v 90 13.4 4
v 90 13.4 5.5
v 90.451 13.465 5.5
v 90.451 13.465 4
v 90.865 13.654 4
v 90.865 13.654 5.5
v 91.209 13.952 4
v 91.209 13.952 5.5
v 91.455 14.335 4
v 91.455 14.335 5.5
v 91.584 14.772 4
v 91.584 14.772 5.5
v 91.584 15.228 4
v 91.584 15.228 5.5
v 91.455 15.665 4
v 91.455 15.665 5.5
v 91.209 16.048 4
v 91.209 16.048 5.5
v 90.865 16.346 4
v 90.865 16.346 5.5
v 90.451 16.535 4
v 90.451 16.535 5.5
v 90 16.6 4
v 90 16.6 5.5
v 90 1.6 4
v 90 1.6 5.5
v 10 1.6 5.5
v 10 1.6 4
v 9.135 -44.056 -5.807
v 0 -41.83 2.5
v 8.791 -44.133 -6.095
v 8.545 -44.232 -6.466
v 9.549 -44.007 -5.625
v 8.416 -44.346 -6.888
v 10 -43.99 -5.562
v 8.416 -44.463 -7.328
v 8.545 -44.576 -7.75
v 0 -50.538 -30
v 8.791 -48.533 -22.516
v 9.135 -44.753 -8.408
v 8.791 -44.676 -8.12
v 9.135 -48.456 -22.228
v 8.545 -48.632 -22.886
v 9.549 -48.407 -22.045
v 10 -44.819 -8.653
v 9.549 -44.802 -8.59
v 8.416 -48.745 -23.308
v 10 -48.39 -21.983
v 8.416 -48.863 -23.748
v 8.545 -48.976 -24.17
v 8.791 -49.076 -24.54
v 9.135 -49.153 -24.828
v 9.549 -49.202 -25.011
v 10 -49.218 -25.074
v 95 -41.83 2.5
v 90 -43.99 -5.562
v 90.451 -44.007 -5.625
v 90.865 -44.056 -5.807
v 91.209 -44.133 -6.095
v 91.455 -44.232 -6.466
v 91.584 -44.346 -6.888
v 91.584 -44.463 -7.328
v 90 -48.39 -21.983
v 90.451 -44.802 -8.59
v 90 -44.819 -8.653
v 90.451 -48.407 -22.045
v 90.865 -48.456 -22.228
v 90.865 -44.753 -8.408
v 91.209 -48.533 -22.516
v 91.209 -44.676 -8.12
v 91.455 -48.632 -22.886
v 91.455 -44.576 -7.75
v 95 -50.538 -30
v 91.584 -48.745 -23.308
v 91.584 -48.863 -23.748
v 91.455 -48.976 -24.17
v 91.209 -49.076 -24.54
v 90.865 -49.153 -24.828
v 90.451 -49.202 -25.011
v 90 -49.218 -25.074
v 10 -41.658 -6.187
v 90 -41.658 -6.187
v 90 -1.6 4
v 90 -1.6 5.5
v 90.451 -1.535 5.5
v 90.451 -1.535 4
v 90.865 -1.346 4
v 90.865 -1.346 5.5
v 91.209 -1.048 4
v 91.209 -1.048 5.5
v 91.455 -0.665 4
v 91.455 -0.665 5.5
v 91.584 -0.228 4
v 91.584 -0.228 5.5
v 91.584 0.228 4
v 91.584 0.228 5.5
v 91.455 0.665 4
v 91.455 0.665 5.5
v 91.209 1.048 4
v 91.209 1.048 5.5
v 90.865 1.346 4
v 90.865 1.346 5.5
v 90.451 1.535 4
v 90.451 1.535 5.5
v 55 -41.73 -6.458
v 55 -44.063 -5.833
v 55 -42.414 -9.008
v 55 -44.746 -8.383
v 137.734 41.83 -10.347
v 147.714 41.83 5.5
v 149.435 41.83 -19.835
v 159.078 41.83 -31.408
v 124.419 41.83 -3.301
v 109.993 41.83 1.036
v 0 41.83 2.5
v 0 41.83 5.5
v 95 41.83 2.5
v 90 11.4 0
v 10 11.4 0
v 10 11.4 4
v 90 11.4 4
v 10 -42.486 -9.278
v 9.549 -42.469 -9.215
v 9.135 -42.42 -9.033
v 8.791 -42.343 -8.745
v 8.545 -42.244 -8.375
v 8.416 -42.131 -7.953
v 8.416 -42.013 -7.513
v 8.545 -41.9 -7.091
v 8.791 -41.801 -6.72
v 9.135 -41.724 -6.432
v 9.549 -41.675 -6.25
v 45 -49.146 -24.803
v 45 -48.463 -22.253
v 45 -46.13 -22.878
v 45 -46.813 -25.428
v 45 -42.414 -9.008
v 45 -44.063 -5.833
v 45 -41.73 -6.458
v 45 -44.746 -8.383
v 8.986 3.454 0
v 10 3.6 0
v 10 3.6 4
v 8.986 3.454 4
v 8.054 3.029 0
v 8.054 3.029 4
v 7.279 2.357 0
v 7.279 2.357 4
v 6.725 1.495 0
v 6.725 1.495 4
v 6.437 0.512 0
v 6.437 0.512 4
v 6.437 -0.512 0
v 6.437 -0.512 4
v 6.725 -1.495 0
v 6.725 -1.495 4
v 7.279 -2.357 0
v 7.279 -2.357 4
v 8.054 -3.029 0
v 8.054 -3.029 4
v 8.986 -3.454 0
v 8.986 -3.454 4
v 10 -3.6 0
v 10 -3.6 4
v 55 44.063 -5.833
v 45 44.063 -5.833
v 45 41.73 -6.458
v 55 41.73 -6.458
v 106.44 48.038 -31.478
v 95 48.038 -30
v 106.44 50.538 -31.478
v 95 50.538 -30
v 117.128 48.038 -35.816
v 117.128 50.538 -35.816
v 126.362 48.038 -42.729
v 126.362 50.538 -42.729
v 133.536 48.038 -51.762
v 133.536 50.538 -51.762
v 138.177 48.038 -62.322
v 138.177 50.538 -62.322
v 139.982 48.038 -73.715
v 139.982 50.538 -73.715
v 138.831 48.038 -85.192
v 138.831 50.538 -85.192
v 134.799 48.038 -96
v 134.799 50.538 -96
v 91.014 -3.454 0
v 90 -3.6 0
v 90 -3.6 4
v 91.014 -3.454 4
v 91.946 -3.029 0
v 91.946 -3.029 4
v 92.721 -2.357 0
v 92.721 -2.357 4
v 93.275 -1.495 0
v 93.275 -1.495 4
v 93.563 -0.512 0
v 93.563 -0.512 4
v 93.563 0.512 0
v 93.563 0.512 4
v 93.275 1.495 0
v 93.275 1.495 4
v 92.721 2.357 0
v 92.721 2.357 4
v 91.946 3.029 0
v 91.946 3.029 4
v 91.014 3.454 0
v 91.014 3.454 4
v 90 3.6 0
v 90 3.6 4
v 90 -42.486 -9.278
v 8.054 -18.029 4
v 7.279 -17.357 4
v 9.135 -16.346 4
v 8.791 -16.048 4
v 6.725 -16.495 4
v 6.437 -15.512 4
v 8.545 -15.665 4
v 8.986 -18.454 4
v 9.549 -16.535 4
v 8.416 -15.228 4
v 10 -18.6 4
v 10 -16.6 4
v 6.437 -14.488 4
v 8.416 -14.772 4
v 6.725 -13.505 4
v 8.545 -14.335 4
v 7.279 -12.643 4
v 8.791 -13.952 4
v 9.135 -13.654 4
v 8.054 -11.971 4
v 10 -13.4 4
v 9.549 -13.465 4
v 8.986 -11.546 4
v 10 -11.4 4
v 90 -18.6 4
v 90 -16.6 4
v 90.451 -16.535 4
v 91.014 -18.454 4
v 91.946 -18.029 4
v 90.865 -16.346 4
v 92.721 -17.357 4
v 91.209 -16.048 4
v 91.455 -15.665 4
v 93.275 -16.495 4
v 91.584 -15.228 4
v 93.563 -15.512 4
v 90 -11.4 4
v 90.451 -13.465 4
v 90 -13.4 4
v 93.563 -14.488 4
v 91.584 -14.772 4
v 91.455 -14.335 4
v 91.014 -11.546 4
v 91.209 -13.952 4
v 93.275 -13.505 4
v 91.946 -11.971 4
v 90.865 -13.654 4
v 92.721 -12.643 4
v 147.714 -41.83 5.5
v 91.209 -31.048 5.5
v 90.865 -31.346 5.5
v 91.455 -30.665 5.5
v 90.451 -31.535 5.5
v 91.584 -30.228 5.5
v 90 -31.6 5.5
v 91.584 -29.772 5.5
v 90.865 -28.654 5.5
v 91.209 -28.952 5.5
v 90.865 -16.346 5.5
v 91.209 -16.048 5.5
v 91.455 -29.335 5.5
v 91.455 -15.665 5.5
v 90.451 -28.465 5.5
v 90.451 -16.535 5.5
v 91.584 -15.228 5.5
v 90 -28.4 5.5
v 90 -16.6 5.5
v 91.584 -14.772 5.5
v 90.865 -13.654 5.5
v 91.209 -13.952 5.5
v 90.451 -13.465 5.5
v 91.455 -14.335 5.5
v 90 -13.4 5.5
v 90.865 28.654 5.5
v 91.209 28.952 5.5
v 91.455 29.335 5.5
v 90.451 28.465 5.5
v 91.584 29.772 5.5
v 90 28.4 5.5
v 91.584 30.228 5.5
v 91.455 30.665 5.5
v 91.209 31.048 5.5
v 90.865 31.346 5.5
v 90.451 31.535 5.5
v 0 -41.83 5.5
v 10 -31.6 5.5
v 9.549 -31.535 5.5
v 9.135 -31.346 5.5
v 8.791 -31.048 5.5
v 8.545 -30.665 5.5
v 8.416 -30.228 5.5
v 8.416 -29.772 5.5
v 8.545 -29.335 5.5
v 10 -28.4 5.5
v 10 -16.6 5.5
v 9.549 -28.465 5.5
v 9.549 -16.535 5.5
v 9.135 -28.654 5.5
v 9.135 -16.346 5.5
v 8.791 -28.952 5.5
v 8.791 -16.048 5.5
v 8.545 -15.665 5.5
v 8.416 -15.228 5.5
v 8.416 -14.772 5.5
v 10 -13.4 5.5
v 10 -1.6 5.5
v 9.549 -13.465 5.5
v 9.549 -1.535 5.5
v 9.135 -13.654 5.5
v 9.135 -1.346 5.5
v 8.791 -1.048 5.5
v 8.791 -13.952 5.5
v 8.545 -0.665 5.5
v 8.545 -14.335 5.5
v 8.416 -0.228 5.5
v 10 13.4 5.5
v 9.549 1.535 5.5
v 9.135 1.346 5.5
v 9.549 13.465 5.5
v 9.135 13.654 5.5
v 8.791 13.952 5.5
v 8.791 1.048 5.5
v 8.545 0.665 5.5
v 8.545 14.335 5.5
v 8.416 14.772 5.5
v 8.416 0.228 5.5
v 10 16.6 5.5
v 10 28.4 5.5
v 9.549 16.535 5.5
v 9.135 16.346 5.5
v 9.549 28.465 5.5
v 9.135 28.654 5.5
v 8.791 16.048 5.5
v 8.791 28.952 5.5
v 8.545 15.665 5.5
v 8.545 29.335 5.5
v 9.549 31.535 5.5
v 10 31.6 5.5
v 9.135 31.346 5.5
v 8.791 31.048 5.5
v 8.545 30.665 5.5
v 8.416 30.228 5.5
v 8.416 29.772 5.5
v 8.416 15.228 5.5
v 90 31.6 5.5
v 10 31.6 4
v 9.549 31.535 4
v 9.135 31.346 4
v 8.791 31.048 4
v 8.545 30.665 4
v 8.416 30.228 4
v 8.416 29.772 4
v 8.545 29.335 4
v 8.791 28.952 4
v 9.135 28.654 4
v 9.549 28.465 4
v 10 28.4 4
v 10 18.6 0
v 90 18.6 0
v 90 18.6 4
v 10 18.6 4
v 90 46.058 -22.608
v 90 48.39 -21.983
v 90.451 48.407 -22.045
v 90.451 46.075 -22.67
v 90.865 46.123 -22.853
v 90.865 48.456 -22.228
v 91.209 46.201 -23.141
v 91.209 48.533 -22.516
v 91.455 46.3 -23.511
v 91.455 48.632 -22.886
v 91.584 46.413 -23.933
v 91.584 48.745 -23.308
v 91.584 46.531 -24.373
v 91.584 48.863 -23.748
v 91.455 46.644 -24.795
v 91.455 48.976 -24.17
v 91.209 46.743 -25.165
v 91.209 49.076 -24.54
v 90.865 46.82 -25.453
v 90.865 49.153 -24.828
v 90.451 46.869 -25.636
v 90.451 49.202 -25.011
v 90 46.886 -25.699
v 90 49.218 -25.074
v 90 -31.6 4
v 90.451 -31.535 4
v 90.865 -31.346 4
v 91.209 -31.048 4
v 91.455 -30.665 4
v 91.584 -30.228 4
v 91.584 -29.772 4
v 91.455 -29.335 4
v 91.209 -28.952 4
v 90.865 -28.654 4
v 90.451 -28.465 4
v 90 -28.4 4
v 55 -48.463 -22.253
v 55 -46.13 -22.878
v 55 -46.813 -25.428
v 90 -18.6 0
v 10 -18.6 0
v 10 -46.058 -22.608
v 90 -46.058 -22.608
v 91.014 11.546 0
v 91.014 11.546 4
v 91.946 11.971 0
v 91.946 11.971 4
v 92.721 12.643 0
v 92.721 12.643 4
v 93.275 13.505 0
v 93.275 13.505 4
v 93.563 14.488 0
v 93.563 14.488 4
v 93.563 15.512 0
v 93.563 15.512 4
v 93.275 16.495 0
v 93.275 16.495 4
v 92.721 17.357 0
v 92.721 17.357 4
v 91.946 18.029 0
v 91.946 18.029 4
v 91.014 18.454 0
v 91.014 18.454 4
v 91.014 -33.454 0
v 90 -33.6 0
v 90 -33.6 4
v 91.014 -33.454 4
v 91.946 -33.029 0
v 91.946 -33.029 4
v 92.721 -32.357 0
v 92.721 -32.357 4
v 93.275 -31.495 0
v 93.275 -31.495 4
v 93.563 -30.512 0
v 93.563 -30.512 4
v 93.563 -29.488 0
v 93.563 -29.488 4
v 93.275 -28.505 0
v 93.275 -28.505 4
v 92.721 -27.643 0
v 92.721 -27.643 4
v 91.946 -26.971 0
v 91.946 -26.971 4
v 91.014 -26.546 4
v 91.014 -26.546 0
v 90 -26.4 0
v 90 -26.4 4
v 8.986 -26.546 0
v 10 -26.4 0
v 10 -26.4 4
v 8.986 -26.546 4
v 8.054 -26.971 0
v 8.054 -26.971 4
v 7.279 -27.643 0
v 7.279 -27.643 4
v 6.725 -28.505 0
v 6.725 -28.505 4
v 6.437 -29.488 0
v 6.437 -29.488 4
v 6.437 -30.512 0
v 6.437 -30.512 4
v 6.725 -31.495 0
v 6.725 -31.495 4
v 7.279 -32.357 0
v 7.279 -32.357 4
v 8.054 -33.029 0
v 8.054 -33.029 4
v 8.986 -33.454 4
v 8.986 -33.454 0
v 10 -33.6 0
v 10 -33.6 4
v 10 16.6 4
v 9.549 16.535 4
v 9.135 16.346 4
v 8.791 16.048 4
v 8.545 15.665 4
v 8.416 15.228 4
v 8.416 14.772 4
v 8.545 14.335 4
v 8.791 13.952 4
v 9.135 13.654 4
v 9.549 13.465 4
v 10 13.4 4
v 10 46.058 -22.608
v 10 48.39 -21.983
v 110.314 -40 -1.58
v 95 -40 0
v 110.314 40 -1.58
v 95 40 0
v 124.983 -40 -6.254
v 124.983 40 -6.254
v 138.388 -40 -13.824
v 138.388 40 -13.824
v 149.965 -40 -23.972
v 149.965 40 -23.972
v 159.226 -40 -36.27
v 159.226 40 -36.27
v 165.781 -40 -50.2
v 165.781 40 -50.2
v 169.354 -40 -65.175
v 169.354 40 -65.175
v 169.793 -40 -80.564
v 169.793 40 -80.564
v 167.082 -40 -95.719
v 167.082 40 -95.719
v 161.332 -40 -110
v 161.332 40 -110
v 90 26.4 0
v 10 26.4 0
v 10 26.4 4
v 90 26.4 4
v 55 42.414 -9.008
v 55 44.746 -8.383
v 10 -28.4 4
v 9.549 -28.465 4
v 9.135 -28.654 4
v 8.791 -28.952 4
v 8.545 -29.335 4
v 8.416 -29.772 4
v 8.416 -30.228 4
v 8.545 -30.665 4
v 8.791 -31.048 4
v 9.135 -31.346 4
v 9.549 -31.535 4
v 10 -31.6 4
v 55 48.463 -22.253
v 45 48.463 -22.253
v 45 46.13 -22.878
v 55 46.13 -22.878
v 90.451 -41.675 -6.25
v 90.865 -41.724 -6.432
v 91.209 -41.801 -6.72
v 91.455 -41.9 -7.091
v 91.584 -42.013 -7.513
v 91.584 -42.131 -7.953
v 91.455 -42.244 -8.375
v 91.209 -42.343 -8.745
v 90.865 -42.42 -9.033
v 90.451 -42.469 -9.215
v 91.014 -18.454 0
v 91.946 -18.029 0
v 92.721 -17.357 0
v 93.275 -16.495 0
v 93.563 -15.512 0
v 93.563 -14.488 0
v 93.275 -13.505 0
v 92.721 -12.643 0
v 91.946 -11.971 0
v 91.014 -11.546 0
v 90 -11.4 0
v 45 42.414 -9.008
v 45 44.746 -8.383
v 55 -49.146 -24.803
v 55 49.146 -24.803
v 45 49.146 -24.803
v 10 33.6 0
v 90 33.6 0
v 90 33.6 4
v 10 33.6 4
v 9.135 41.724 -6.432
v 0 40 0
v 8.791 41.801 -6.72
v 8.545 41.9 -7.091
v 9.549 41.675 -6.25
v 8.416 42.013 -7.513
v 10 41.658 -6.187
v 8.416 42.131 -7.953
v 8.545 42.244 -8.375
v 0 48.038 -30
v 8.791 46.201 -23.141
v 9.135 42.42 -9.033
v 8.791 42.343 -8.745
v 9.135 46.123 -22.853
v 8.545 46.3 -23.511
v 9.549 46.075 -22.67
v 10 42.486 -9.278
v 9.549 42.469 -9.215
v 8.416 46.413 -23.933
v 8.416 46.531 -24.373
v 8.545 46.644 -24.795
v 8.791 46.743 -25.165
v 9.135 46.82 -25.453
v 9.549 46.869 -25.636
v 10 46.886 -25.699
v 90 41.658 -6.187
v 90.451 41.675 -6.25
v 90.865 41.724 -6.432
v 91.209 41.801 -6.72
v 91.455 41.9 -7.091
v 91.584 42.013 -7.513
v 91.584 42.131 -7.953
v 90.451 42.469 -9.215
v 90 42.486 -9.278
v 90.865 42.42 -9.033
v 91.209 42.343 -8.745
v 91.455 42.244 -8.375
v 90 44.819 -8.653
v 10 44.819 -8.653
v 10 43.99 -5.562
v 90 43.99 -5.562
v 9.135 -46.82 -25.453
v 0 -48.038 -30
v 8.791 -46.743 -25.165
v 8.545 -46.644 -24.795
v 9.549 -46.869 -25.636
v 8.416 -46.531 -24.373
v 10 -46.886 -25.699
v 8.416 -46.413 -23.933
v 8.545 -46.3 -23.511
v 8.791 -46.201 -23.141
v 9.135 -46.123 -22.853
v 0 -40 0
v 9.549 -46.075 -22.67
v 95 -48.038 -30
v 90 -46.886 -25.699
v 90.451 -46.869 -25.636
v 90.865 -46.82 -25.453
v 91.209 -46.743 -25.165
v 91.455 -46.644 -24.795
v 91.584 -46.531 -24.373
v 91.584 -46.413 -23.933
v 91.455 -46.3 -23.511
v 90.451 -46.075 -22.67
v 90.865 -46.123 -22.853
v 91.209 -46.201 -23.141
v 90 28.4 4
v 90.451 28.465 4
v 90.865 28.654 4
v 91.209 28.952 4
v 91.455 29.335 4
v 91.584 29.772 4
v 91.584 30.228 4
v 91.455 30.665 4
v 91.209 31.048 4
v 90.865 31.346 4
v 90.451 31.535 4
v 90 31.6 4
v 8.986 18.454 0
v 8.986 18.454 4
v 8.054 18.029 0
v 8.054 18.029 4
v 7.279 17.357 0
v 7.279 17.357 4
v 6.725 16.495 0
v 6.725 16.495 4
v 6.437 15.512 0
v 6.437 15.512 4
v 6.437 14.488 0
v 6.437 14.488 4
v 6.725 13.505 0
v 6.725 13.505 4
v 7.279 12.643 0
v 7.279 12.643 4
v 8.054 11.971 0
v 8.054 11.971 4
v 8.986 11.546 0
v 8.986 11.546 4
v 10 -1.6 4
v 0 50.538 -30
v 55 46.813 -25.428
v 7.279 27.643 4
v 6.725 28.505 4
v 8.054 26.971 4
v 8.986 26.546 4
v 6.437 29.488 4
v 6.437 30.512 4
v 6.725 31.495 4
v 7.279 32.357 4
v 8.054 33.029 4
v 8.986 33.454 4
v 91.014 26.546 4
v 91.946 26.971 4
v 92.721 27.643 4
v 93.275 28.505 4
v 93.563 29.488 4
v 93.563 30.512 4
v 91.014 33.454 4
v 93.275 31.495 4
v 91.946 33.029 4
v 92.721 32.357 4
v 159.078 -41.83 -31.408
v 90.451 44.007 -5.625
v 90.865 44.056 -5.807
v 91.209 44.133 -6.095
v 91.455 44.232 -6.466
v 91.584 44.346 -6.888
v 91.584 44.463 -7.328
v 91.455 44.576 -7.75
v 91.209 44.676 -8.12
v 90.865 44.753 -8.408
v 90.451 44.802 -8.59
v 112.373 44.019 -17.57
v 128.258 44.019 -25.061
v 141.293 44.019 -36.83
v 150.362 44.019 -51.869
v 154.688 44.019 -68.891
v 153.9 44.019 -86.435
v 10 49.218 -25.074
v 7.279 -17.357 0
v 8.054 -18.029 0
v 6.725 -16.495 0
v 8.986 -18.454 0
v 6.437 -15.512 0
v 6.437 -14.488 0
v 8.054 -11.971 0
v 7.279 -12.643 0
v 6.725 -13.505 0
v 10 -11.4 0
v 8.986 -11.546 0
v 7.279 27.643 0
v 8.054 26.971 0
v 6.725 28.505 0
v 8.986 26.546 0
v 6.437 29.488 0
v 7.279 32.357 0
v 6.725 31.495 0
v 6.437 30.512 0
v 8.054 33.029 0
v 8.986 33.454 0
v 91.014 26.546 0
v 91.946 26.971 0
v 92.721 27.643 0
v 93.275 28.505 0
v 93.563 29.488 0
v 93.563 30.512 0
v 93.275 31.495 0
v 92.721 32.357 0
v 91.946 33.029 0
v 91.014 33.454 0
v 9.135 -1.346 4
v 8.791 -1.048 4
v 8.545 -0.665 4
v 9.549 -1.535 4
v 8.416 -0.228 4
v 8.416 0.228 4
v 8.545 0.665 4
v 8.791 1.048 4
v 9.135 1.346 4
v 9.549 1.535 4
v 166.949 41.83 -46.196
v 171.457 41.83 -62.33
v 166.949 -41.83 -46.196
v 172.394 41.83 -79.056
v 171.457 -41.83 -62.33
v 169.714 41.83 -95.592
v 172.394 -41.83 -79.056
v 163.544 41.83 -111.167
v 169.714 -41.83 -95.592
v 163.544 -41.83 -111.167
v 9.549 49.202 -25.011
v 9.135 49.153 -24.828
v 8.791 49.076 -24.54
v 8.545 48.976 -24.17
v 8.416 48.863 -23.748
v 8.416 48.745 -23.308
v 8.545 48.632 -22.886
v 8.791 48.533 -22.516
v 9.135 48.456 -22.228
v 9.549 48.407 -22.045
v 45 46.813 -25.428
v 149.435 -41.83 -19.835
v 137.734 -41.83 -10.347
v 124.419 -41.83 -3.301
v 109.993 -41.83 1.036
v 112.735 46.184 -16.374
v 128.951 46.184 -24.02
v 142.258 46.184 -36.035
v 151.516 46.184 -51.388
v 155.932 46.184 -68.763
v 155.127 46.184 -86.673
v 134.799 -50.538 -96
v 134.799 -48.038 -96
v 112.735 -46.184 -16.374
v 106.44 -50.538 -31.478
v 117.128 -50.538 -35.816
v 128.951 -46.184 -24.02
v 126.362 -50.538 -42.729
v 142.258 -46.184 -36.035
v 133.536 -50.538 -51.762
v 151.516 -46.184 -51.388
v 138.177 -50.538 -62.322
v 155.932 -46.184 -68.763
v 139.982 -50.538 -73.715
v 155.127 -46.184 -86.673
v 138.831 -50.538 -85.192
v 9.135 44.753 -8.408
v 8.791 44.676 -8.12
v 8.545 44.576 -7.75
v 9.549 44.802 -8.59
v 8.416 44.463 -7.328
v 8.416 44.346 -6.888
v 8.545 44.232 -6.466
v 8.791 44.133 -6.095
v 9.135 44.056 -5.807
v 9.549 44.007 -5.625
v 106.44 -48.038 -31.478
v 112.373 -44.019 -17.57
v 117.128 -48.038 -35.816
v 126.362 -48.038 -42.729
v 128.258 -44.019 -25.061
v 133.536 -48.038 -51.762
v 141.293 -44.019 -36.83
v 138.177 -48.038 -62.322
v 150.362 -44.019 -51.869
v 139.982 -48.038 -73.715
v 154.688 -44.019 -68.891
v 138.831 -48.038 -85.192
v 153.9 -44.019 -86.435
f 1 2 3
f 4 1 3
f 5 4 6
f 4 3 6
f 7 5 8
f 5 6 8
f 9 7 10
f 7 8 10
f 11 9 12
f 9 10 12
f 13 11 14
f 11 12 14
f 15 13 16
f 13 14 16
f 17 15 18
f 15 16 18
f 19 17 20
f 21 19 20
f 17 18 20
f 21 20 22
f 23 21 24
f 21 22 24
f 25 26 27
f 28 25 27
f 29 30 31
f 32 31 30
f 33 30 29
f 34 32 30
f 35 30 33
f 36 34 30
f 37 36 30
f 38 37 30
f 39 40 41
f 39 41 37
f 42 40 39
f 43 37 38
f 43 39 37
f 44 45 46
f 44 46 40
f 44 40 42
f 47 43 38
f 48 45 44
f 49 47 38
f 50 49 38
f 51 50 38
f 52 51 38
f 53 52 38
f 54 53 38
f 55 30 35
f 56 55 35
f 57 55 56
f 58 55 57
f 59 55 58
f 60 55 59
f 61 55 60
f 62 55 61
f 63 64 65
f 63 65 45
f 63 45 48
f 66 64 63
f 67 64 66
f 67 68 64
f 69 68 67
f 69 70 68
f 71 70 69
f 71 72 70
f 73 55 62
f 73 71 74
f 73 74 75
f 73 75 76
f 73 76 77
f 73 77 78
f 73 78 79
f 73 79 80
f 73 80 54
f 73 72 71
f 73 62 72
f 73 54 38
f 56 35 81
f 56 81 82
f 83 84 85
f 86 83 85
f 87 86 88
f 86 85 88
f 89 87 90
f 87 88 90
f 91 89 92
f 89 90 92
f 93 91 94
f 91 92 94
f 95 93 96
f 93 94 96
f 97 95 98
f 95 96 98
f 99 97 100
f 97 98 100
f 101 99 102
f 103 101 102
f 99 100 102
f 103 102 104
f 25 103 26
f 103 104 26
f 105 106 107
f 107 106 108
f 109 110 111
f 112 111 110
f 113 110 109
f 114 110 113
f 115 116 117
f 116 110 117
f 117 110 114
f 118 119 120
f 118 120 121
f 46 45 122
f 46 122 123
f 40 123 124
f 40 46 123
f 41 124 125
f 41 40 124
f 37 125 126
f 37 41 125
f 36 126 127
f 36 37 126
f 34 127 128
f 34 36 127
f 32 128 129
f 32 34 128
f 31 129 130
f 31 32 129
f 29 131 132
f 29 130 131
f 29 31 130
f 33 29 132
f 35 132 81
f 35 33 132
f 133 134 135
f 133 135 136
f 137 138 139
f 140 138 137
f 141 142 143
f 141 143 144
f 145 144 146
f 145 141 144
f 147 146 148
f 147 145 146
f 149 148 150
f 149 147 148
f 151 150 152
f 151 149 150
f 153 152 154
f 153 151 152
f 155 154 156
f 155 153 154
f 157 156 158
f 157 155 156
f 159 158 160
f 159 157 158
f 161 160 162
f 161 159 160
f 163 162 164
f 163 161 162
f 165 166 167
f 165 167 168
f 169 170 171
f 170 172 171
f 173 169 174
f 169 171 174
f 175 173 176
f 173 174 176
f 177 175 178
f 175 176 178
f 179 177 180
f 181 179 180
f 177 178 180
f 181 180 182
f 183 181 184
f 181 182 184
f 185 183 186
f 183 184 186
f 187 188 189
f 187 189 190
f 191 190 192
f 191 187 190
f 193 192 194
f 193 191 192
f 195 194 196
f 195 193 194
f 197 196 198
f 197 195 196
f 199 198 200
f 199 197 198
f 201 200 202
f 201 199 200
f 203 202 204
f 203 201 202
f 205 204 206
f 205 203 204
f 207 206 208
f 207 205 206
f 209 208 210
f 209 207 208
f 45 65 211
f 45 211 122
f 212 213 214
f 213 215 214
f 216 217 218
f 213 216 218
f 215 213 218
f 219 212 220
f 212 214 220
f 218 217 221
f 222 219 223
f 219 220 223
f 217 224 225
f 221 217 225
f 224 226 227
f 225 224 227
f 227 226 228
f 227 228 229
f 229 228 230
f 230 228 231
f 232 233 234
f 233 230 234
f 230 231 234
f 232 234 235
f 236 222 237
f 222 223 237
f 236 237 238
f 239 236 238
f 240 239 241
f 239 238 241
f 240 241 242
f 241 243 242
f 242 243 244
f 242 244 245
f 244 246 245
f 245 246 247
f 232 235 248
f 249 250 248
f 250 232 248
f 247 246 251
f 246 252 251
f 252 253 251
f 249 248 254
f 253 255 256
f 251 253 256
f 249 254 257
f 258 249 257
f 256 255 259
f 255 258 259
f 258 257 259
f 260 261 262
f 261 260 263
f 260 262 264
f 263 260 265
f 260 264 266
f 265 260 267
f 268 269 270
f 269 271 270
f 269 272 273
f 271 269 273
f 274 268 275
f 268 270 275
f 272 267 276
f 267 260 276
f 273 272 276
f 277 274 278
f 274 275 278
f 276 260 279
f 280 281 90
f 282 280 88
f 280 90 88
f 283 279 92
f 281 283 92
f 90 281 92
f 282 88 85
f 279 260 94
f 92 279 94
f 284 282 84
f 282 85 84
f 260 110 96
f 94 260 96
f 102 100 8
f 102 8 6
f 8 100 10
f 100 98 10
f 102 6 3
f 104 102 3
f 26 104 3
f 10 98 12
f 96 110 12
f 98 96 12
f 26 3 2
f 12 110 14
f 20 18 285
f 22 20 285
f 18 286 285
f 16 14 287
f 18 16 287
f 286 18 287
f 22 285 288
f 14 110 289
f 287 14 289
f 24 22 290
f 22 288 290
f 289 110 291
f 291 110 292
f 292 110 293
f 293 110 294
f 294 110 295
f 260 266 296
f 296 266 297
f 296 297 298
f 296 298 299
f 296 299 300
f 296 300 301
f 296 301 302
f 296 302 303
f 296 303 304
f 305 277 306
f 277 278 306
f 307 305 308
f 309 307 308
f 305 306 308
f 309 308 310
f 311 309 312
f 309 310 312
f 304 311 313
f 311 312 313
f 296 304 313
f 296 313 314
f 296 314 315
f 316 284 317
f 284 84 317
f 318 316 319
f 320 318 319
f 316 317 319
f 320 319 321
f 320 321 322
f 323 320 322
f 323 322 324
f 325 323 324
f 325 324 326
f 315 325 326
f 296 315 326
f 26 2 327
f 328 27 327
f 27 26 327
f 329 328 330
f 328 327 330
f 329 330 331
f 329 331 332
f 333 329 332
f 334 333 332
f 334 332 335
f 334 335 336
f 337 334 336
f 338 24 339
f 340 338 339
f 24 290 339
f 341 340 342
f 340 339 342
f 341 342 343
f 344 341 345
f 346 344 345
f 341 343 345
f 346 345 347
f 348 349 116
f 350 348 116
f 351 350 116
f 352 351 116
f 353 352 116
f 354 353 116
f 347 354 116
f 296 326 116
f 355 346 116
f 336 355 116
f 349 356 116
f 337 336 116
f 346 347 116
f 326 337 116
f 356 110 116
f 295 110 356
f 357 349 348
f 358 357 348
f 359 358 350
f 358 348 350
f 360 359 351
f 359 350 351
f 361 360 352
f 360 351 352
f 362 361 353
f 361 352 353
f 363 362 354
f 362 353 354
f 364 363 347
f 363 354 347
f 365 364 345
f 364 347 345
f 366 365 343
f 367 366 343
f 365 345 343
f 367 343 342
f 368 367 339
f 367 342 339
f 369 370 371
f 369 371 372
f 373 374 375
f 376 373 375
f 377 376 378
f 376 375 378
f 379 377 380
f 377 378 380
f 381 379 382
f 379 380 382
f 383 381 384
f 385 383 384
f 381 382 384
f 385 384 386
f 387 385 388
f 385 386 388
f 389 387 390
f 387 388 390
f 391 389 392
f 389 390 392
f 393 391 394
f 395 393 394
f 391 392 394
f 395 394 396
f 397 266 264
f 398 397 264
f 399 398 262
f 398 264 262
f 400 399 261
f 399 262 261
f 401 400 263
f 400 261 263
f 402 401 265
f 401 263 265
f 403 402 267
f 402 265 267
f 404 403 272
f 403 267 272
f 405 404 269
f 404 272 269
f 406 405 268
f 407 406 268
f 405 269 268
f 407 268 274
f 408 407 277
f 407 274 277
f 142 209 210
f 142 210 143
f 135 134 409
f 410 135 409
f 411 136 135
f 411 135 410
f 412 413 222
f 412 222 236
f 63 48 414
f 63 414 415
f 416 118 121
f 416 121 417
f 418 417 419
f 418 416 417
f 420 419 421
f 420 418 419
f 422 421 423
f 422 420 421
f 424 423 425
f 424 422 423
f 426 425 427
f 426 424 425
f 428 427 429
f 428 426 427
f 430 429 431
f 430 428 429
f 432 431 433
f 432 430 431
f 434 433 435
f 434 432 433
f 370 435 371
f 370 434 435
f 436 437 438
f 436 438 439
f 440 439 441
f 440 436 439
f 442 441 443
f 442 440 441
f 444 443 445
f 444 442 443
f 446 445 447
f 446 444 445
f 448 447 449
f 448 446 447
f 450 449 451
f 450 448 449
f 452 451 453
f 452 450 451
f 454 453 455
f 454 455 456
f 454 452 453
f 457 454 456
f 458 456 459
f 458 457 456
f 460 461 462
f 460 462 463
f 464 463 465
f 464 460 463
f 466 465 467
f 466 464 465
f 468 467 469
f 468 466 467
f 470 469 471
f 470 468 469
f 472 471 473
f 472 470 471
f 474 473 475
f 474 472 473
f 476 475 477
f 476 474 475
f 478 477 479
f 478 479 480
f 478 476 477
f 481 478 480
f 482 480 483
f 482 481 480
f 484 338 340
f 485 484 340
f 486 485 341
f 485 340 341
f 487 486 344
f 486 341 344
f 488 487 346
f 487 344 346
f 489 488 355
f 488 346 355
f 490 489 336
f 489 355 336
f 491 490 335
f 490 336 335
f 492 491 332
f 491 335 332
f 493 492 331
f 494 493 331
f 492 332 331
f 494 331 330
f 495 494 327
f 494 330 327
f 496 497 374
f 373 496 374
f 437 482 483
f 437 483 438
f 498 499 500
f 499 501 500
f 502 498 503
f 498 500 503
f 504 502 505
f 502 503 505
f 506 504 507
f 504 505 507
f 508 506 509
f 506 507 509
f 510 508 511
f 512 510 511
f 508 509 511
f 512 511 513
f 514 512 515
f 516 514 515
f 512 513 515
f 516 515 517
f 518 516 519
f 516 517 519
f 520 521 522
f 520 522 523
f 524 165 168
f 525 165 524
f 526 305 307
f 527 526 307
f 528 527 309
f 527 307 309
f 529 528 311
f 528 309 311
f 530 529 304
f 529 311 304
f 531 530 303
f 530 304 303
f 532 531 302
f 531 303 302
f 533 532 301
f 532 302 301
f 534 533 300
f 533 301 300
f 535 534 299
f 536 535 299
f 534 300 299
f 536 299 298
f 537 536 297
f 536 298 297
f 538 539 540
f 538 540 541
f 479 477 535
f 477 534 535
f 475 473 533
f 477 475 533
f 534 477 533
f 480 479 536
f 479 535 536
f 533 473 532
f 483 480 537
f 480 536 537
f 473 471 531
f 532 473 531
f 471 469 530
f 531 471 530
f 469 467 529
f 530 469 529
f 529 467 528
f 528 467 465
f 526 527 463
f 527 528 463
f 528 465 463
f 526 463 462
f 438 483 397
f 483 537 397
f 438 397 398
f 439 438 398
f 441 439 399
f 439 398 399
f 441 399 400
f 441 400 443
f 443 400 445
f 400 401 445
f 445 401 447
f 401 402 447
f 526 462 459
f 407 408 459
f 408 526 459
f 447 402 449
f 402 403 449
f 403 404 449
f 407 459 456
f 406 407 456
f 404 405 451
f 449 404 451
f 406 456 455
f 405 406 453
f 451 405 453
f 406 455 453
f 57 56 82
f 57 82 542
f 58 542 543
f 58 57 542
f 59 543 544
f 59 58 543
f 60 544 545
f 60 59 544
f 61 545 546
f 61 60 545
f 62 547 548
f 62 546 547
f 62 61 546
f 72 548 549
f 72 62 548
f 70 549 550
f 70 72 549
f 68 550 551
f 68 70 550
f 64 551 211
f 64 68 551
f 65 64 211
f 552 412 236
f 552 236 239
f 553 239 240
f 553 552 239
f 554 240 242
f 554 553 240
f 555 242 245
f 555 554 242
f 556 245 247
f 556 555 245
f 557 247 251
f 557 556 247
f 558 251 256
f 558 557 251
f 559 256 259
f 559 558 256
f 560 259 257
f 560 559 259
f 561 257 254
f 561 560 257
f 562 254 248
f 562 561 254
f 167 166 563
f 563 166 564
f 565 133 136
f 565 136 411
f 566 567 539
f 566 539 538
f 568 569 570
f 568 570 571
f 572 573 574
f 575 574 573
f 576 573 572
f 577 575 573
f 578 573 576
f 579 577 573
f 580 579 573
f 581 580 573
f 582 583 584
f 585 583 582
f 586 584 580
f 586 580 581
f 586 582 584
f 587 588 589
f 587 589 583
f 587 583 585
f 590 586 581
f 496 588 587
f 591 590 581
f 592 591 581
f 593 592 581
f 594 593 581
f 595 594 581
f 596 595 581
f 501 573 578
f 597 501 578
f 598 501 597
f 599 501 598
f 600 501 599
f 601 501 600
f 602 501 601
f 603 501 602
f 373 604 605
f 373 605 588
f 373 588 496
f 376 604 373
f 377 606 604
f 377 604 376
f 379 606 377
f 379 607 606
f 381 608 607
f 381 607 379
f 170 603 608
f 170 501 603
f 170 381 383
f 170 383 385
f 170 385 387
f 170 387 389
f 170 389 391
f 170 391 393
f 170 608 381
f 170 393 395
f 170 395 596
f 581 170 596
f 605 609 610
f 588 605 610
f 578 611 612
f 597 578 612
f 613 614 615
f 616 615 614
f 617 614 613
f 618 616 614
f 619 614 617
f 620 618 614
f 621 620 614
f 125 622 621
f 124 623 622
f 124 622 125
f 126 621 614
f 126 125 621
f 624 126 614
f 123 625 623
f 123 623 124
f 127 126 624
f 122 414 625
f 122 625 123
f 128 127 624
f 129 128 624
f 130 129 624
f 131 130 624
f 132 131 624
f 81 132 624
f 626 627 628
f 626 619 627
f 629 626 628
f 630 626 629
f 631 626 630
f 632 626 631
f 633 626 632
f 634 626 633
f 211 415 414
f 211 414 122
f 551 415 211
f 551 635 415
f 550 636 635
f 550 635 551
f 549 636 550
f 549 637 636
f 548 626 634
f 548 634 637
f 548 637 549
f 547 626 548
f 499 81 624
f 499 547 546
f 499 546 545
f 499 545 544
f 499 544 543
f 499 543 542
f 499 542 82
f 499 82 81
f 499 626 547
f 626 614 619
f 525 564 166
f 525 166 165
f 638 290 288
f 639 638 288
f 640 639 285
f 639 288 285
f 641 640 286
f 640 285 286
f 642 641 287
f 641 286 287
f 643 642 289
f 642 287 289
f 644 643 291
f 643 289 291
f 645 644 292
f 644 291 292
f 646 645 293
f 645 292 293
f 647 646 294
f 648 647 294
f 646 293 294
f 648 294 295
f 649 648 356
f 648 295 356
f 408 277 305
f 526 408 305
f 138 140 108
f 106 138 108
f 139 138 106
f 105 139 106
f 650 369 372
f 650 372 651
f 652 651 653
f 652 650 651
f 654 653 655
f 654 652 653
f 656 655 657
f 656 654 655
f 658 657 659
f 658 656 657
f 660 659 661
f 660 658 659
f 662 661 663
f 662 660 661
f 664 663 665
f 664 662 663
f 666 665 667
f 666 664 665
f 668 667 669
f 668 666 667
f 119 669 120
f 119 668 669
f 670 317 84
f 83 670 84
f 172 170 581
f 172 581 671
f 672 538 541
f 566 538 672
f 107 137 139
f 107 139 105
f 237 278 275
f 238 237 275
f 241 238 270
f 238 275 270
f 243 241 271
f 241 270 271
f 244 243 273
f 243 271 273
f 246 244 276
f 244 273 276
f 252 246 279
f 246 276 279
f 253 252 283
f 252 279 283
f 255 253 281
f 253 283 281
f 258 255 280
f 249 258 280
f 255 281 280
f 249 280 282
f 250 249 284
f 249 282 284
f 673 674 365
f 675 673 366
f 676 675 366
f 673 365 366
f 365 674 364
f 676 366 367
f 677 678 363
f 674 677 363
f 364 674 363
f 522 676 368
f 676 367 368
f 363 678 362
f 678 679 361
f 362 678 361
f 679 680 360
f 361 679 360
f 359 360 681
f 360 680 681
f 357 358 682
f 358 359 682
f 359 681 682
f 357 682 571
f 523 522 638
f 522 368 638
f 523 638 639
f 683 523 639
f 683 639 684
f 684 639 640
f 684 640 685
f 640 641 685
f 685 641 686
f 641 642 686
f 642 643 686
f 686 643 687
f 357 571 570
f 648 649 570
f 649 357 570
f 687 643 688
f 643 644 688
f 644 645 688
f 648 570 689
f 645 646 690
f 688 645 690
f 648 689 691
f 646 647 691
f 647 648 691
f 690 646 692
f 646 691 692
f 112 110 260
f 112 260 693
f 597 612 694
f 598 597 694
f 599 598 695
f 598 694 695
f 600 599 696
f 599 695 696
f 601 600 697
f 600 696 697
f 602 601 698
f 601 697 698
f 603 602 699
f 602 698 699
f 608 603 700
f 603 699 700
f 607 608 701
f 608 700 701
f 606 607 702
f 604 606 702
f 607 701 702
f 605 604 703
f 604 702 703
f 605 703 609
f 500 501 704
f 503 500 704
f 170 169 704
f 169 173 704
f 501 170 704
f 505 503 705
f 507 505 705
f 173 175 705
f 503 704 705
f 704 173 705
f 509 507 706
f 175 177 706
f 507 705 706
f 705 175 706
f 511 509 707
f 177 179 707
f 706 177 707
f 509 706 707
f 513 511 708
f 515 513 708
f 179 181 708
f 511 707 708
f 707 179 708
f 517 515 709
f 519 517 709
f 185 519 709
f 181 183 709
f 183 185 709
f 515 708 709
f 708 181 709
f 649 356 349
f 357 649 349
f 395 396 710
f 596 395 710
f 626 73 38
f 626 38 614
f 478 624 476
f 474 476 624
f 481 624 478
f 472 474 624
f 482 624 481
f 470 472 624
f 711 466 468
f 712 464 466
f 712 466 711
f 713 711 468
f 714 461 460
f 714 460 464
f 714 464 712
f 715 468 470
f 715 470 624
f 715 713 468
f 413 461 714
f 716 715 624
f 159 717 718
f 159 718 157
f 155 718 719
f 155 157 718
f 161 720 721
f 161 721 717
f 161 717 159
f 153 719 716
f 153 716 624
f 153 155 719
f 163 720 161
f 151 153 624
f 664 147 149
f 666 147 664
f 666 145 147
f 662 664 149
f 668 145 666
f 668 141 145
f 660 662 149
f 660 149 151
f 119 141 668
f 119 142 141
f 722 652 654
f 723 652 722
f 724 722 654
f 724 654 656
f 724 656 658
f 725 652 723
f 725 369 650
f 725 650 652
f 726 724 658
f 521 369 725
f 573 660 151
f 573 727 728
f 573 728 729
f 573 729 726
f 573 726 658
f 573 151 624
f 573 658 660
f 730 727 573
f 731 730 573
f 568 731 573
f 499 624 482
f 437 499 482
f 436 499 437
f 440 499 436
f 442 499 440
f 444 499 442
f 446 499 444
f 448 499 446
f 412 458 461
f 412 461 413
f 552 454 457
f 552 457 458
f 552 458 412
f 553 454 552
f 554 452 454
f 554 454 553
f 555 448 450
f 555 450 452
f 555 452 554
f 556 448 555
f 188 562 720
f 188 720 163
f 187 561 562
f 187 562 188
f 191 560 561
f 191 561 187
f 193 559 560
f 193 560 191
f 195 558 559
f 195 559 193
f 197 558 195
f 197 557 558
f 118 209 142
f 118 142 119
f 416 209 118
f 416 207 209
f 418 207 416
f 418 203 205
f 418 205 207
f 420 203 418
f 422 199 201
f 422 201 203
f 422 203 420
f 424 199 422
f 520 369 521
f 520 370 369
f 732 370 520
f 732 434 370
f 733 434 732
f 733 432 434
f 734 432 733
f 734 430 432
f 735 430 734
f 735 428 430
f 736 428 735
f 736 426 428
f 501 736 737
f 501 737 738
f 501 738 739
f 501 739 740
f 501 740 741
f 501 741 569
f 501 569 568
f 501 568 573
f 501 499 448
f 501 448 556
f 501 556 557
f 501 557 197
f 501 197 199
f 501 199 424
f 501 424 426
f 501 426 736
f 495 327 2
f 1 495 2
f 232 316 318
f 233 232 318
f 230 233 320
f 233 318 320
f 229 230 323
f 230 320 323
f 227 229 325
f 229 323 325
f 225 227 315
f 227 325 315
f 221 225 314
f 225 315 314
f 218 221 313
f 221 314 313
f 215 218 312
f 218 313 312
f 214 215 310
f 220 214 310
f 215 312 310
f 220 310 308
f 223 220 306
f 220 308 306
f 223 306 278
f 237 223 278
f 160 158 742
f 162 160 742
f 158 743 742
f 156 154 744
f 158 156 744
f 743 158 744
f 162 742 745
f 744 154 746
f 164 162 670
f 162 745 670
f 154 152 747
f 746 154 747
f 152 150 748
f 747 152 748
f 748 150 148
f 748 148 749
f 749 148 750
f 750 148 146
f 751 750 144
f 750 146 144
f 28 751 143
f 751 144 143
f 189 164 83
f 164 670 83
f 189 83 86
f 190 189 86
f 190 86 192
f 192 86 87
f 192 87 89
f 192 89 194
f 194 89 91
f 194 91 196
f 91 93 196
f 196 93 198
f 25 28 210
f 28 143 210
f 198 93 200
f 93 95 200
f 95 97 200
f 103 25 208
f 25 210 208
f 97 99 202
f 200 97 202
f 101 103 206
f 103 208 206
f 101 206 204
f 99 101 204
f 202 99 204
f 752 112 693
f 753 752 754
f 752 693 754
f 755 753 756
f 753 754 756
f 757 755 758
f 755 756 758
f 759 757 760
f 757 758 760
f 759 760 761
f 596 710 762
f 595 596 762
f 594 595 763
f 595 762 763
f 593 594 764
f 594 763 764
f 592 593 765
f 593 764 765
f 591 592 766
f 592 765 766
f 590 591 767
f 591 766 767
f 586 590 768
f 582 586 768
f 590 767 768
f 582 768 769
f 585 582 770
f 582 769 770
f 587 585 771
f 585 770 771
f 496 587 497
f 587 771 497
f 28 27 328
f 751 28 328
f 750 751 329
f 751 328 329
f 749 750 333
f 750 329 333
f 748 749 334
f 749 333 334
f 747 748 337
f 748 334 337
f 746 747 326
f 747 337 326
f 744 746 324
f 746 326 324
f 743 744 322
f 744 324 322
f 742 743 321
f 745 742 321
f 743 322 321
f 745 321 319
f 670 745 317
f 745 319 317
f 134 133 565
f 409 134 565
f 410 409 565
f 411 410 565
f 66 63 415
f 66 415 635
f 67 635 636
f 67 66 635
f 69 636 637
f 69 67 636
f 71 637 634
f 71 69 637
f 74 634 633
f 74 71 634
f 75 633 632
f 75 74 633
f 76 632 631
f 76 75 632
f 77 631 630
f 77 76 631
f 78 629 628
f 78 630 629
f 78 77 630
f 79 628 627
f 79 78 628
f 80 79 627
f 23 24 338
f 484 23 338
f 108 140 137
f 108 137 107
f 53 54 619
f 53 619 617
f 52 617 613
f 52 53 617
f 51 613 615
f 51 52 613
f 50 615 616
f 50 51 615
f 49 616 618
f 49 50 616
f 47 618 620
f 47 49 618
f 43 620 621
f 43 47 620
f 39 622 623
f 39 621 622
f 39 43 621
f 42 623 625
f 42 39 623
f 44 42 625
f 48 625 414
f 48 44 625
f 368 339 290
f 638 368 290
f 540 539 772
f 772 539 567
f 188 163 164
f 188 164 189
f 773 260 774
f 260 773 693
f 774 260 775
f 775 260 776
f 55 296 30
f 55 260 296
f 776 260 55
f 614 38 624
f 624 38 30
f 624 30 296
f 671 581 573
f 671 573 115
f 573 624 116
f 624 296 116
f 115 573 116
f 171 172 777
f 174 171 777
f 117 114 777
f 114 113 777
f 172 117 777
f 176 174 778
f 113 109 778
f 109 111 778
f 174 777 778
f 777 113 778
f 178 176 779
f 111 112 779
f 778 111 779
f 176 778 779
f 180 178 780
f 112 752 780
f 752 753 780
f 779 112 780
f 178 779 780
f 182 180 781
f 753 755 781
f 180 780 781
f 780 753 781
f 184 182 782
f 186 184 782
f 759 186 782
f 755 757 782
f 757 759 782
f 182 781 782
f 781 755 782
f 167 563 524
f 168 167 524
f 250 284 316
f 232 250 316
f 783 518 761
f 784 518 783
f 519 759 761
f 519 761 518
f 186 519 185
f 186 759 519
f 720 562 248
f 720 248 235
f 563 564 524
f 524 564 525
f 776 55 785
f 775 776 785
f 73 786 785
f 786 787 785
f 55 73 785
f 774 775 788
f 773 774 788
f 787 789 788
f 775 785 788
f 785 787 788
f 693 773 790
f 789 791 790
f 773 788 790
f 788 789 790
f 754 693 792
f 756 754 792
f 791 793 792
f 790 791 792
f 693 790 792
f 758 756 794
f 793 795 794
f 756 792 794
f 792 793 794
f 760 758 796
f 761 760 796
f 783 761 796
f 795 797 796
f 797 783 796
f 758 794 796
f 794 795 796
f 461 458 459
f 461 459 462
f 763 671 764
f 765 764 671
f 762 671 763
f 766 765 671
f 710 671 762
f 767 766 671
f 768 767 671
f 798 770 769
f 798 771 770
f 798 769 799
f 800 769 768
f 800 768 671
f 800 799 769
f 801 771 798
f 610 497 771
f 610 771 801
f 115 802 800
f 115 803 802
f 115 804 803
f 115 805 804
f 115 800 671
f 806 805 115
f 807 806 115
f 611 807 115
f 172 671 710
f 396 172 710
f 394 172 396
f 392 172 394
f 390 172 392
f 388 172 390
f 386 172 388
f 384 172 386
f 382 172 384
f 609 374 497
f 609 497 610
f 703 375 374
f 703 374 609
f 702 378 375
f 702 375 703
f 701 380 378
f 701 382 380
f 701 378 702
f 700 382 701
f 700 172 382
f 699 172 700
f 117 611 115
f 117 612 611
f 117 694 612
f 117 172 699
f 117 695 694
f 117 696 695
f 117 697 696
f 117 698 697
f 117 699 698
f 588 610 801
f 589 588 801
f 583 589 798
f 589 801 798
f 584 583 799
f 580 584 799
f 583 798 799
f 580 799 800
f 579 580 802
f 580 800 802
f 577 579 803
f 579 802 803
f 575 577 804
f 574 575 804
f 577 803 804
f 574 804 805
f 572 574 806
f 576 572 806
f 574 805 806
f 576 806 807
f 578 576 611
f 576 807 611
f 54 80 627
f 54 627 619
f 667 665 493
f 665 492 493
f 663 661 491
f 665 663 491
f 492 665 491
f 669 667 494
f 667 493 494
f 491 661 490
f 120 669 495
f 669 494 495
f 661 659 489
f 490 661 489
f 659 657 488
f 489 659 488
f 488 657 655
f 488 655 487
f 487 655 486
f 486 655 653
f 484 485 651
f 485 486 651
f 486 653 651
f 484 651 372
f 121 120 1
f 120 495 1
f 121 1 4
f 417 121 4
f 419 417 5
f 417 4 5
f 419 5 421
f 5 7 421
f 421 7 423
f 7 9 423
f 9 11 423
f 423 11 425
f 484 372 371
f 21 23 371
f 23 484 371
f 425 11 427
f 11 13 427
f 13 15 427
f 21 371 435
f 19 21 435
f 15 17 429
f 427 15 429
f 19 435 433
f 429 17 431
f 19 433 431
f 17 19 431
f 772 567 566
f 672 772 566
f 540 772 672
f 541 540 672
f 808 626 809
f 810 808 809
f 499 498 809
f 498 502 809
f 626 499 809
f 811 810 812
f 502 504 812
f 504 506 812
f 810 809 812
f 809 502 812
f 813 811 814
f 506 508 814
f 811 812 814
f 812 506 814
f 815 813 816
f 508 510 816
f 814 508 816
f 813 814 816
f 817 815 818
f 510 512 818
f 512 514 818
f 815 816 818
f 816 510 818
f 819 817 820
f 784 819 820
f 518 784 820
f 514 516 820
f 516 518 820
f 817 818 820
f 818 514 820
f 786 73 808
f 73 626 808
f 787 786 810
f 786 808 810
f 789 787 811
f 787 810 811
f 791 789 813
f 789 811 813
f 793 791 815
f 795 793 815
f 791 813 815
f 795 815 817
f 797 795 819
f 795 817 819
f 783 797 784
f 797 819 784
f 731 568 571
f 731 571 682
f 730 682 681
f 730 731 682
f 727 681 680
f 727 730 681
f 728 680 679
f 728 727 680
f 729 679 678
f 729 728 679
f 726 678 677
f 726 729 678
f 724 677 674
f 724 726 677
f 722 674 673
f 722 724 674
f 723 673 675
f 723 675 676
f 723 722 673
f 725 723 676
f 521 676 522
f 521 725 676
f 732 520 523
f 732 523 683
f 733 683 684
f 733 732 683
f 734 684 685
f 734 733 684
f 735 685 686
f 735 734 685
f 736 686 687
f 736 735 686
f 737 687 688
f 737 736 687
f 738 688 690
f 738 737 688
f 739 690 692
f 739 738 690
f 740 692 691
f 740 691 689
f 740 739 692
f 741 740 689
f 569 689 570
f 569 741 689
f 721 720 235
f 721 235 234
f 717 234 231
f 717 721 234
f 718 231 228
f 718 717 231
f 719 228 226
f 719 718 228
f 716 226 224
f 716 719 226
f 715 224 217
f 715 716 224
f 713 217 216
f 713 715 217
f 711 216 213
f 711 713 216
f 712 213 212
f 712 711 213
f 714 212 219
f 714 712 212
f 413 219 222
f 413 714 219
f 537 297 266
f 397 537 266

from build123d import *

# Parameters (mm, degrees)
CUT_EXTRUDE1_DEPTH    = 2.5
BOSS_EXTRUDE1_START   = -3
SKETCH7_W             = 95
SKETCH7_H             = 83.660254038
BOSS_EXTRUDE1_DEPTH   = 3
CUT_EXTRUDE2_DEPTH    = 4
CUT_EXTRUDE3_DEPTH    = 105.15629562
SKETCH13_W            = 10
SKETCH13_H            = 2.64
BOSS_EXTRUDE2_DEPTH   = 2.414814566
BOSS_EXTRUDE2_2_DEPTH = 2.414814566


with BuildPart() as part:
    # Sweep1: sweep along a path in Sketch2
    with BuildLine(Plane(origin=(0, 0, 0), x_dir=(1, 0, 0), z_dir=(0, 1, 0))) as sweep1_path:
        Line((0, 0), (95, 0))
        ThreePointArc((95, 0), (159.226162893, 36.270166538), (161.332495807, 110))
    # Sketch4 → Sweep1 (sweep)
    with BuildSketch(Plane(origin=(0, 0, 0), x_dir=(0, 0, -1), z_dir=(1, 0, 0))):
        Polygon((0, -40), (0, 40), (30, 48.038475773), (30, 50.538475773), (-2.5, 41.830127019), (-2.5, -41.830127019), (30, -50.538475773), (30, -48.038475773), align=None)
    sweep(path=sweep1_path.line)

    # Sketch6 → Cut-Extrude1 (cut)
    with BuildSketch(Plane(origin=(53, 0, 2.5), x_dir=(-1, 0, 0), z_dir=(0, 0, -1))):
        with BuildLine():
            Line((43, 28.4), (-37, 28.4))
            ThreePointArc((-37, 28.4), (-38.6, 30), (-37, 31.6))
            Line((-37, 31.6), (43, 31.6))
            ThreePointArc((43, 31.6), (44.6, 30), (43, 28.4))
        make_face()
        with BuildLine():
            Line((43, -1.6), (-37, -1.6))
            ThreePointArc((-37, -1.6), (-38.6, 0), (-37, 1.6))
            Line((-37, 1.6), (43, 1.6))
            ThreePointArc((43, 1.6), (44.6, 0), (43, -1.6))
        make_face()
        with BuildLine():
            Line((43, -31.6), (-37, -31.6))
            ThreePointArc((-37, -31.6), (-38.6, -30), (-37, -28.4))
            Line((-37, -28.4), (43, -28.4))
            ThreePointArc((43, -28.4), (44.6, -30), (43, -31.6))
        make_face()
        with BuildLine():
            Line((43, -16.6), (-37, -16.6))
            ThreePointArc((-37, -16.6), (-38.6, -15), (-37, -13.4))
            Line((-37, -13.4), (43, -13.4))
            ThreePointArc((43, -13.4), (44.6, -15), (43, -16.6))
        make_face()
        with BuildLine():
            Line((43, 13.4), (-37, 13.4))
            ThreePointArc((-37, 13.4), (-38.6, 15), (-37, 16.6))
            Line((-37, 16.6), (43, 16.6))
            ThreePointArc((43, 16.6), (44.6, 15), (43, 13.4))
        make_face()
    extrude(amount=CUT_EXTRUDE1_DEPTH, mode=Mode.SUBTRACT)

    # Sketch7 → Boss-Extrude1 (add)
    with BuildSketch(Plane(origin=(50, 0, 2.5), x_dir=(-1, 0, 0), z_dir=(0, 0, -1)).offset(BOSS_EXTRUDE1_START)):
        with Locations((2.5, 0)):
            Rectangle(SKETCH7_W, SKETCH7_H)
        with BuildLine():
            Line((-40, 31.6), (40, 31.6))
            ThreePointArc((40, 31.6), (41.6, 30), (40, 28.4))
            Line((40, 28.4), (-40, 28.4))
            ThreePointArc((-40, 28.4), (-41.6, 30), (-40, 31.6))
        make_face(mode=Mode.SUBTRACT)
        with BuildLine():
            Line((-40, 16.6), (40, 16.6))
            ThreePointArc((40, 16.6), (41.6, 15), (40, 13.4))
            Line((40, 13.4), (-40, 13.4))
            ThreePointArc((-40, 13.4), (-41.6, 15), (-40, 16.6))
        make_face(mode=Mode.SUBTRACT)
        with BuildLine():
            Line((40, -1.6), (-40, -1.6))
            ThreePointArc((-40, -1.6), (-41.6, 0), (-40, 1.6))
            Line((-40, 1.6), (40, 1.6))
            ThreePointArc((40, 1.6), (41.6, 0), (40, -1.6))
        make_face(mode=Mode.SUBTRACT)
        with BuildLine():
            Line((-40, -13.4), (40, -13.4))
            ThreePointArc((40, -13.4), (41.6, -15), (40, -16.6))
            Line((40, -16.6), (-40, -16.6))
            ThreePointArc((-40, -16.6), (-41.6, -15), (-40, -13.4))
        make_face(mode=Mode.SUBTRACT)
        with BuildLine():
            Line((-40, -28.4), (40, -28.4))
            ThreePointArc((40, -28.4), (41.6, -30), (40, -31.6))
            Line((40, -31.6), (-40, -31.6))
            ThreePointArc((-40, -31.6), (-41.6, -30), (-40, -28.4))
        make_face(mode=Mode.SUBTRACT)
    extrude(amount=BOSS_EXTRUDE1_DEPTH)

    # Sketch9 → Cut-Extrude2 (cut)
    with BuildSketch(Plane(origin=(50, 0, 0), x_dir=(-1, 0, 0), z_dir=(0, 0, -1))):
        with BuildLine():
            Line((-40, 33.6), (40, 33.6))
            ThreePointArc((40, 33.6), (43.6, 30), (40, 26.4))
            Line((40, 26.4), (-40, 26.4))
            ThreePointArc((-40, 26.4), (-43.6, 30), (-40, 33.6))
        make_face()
        with BuildLine():
            Line((-40, 18.6), (40, 18.6))
            ThreePointArc((40, 18.6), (43.6, 15), (40, 11.4))
            Line((40, 11.4), (-40, 11.4))
            ThreePointArc((-40, 11.4), (-43.6, 15), (-40, 18.6))
        make_face()
        with BuildLine():
            Line((-40, 3.6), (40, 3.6))
            ThreePointArc((40, 3.6), (43.6, 0), (40, -3.6))
            Line((40, -3.6), (-40, -3.6))
            ThreePointArc((-40, -3.6), (-43.6, 0), (-40, 3.6))
        make_face()
        with BuildLine():
            Line((-40, -11.4), (40, -11.4))
            ThreePointArc((40, -11.4), (43.6, -15), (40, -18.6))
            Line((40, -18.6), (-40, -18.6))
            ThreePointArc((-40, -18.6), (-43.6, -15), (-40, -11.4))
        make_face()
        with BuildLine():
            Line((-40, -26.4), (40, -26.4))
            ThreePointArc((40, -26.4), (43.6, -30), (40, -33.6))
            Line((40, -33.6), (-40, -33.6))
            ThreePointArc((-40, -33.6), (-43.6, -30), (-40, -26.4))
        make_face()
    extrude(amount=-CUT_EXTRUDE2_DEPTH, mode=Mode.SUBTRACT)

    # Sketch10 → Cut-Extrude3 (cut)
    with BuildSketch(Plane(origin=(51.866025404, 52.619546181, -37.766660498), x_dir=(0, -0.2588190451025259, 0.965925826289067), z_dir=(0, -0.965925826289067, -0.2588190451025259))):
        with BuildLine():
            Line((16.340638615, 41.866025404), (16.340638615, -38.133974596))
            ThreePointArc((16.340638615, -38.133974596), (14.740638615, -39.733974596), (13.140638615, -38.133974596))
            Line((13.140638615, -38.133974596), (13.140638615, 41.866025404))
            ThreePointArc((13.140638615, 41.866025404), (14.740638615, 43.466025404), (16.340638615, 41.866025404))
        make_face()
        with BuildLine():
            Line((33.340638615, 41.866025404), (33.340638615, -38.133974596))
            ThreePointArc((33.340638615, -38.133974596), (31.740638615, -39.733974596), (30.140638615, -38.133974596))
            Line((30.140638615, -38.133974596), (30.140638615, 41.866025404))
            ThreePointArc((30.140638615, 41.866025404), (31.740638615, 43.466025404), (33.340638615, 41.866025404))
        make_face()
    cut_extrude3 = extrude(amount=CUT_EXTRUDE3_DEPTH, mode=Mode.SUBTRACT)

    # Chamfer1
    # the kernel refuses this chamfer: 370 mm, written as the material it adds along each edge
    with BuildSketch(Plane(origin=(95, 41.830127019, 2.5), x_dir=(-0.02311618515334583, 0, 0.9997327852901275), z_dir=(0, -1, 0))) as chamfer1_piece_1_section:
        with BuildLine():
            Line((174.160123938, -4.026993743), (-35.380524296, -63.277258154))
            ThreePointArc((-35.380524296, -63.277258154), (-13.18277005, -41.477507792), (0, 0))
            Line((0, 0), (174.160123938, -4.026993743))
        make_face()
    chamfer1_piece_1 = extrude(amount=83.660254038, mode=Mode.PRIVATE)
    chamfer1_piece_1 = split(chamfer1_piece_1, bisect_by=Plane(origin=(121.511498595, 41.56256682, 5.5), z_dir=(0, 0, -1)), keep=Keep.TOP, mode=Mode.PRIVATE)
    add(chamfer1_piece_1)

    # Mirror1: Cut-Extrude3 across plane
    add(cut_extrude3.mirror(Plane.ZX), mode=Mode.SUBTRACT)


with BuildPart() as body_2:
    # Sketch13 → Boss-Extrude2 (new body)
    with BuildSketch(Plane(origin=(0, 39.65303983, 10.625), x_dir=(1, 0, 0), z_dir=(0, 0.965925826289067, 0.2588190451025258))):
        with Locations((50, 18.358094829)):
            Rectangle(SKETCH13_W, SKETCH13_H)
    extrude(amount=-BOSS_EXTRUDE2_DEPTH)


with BuildPart() as body_3:
    # Sketch13 → Boss-Extrude2 2 (new body)
    with BuildSketch(Plane(origin=(0, 39.65303983, 10.625), x_dir=(1, 0, 0), z_dir=(0, 0.965925826289067, 0.2588190451025258))):
        with Locations((50, 35.358094829)):
            Rectangle(SKETCH13_W, SKETCH13_H)
    extrude(amount=-BOSS_EXTRUDE2_2_DEPTH)


with BuildPart() as body_4:
    # Mirror3: mirrored copy
    add(body_3.part.mirror(Plane.ZX))


with BuildPart() as body_5:
    # Mirror3 2: mirrored copy
    add(body_2.part.mirror(Plane.ZX))


solid = Compound([part.part, body_2.part, body_3.part, body_4.part, body_5.part])
